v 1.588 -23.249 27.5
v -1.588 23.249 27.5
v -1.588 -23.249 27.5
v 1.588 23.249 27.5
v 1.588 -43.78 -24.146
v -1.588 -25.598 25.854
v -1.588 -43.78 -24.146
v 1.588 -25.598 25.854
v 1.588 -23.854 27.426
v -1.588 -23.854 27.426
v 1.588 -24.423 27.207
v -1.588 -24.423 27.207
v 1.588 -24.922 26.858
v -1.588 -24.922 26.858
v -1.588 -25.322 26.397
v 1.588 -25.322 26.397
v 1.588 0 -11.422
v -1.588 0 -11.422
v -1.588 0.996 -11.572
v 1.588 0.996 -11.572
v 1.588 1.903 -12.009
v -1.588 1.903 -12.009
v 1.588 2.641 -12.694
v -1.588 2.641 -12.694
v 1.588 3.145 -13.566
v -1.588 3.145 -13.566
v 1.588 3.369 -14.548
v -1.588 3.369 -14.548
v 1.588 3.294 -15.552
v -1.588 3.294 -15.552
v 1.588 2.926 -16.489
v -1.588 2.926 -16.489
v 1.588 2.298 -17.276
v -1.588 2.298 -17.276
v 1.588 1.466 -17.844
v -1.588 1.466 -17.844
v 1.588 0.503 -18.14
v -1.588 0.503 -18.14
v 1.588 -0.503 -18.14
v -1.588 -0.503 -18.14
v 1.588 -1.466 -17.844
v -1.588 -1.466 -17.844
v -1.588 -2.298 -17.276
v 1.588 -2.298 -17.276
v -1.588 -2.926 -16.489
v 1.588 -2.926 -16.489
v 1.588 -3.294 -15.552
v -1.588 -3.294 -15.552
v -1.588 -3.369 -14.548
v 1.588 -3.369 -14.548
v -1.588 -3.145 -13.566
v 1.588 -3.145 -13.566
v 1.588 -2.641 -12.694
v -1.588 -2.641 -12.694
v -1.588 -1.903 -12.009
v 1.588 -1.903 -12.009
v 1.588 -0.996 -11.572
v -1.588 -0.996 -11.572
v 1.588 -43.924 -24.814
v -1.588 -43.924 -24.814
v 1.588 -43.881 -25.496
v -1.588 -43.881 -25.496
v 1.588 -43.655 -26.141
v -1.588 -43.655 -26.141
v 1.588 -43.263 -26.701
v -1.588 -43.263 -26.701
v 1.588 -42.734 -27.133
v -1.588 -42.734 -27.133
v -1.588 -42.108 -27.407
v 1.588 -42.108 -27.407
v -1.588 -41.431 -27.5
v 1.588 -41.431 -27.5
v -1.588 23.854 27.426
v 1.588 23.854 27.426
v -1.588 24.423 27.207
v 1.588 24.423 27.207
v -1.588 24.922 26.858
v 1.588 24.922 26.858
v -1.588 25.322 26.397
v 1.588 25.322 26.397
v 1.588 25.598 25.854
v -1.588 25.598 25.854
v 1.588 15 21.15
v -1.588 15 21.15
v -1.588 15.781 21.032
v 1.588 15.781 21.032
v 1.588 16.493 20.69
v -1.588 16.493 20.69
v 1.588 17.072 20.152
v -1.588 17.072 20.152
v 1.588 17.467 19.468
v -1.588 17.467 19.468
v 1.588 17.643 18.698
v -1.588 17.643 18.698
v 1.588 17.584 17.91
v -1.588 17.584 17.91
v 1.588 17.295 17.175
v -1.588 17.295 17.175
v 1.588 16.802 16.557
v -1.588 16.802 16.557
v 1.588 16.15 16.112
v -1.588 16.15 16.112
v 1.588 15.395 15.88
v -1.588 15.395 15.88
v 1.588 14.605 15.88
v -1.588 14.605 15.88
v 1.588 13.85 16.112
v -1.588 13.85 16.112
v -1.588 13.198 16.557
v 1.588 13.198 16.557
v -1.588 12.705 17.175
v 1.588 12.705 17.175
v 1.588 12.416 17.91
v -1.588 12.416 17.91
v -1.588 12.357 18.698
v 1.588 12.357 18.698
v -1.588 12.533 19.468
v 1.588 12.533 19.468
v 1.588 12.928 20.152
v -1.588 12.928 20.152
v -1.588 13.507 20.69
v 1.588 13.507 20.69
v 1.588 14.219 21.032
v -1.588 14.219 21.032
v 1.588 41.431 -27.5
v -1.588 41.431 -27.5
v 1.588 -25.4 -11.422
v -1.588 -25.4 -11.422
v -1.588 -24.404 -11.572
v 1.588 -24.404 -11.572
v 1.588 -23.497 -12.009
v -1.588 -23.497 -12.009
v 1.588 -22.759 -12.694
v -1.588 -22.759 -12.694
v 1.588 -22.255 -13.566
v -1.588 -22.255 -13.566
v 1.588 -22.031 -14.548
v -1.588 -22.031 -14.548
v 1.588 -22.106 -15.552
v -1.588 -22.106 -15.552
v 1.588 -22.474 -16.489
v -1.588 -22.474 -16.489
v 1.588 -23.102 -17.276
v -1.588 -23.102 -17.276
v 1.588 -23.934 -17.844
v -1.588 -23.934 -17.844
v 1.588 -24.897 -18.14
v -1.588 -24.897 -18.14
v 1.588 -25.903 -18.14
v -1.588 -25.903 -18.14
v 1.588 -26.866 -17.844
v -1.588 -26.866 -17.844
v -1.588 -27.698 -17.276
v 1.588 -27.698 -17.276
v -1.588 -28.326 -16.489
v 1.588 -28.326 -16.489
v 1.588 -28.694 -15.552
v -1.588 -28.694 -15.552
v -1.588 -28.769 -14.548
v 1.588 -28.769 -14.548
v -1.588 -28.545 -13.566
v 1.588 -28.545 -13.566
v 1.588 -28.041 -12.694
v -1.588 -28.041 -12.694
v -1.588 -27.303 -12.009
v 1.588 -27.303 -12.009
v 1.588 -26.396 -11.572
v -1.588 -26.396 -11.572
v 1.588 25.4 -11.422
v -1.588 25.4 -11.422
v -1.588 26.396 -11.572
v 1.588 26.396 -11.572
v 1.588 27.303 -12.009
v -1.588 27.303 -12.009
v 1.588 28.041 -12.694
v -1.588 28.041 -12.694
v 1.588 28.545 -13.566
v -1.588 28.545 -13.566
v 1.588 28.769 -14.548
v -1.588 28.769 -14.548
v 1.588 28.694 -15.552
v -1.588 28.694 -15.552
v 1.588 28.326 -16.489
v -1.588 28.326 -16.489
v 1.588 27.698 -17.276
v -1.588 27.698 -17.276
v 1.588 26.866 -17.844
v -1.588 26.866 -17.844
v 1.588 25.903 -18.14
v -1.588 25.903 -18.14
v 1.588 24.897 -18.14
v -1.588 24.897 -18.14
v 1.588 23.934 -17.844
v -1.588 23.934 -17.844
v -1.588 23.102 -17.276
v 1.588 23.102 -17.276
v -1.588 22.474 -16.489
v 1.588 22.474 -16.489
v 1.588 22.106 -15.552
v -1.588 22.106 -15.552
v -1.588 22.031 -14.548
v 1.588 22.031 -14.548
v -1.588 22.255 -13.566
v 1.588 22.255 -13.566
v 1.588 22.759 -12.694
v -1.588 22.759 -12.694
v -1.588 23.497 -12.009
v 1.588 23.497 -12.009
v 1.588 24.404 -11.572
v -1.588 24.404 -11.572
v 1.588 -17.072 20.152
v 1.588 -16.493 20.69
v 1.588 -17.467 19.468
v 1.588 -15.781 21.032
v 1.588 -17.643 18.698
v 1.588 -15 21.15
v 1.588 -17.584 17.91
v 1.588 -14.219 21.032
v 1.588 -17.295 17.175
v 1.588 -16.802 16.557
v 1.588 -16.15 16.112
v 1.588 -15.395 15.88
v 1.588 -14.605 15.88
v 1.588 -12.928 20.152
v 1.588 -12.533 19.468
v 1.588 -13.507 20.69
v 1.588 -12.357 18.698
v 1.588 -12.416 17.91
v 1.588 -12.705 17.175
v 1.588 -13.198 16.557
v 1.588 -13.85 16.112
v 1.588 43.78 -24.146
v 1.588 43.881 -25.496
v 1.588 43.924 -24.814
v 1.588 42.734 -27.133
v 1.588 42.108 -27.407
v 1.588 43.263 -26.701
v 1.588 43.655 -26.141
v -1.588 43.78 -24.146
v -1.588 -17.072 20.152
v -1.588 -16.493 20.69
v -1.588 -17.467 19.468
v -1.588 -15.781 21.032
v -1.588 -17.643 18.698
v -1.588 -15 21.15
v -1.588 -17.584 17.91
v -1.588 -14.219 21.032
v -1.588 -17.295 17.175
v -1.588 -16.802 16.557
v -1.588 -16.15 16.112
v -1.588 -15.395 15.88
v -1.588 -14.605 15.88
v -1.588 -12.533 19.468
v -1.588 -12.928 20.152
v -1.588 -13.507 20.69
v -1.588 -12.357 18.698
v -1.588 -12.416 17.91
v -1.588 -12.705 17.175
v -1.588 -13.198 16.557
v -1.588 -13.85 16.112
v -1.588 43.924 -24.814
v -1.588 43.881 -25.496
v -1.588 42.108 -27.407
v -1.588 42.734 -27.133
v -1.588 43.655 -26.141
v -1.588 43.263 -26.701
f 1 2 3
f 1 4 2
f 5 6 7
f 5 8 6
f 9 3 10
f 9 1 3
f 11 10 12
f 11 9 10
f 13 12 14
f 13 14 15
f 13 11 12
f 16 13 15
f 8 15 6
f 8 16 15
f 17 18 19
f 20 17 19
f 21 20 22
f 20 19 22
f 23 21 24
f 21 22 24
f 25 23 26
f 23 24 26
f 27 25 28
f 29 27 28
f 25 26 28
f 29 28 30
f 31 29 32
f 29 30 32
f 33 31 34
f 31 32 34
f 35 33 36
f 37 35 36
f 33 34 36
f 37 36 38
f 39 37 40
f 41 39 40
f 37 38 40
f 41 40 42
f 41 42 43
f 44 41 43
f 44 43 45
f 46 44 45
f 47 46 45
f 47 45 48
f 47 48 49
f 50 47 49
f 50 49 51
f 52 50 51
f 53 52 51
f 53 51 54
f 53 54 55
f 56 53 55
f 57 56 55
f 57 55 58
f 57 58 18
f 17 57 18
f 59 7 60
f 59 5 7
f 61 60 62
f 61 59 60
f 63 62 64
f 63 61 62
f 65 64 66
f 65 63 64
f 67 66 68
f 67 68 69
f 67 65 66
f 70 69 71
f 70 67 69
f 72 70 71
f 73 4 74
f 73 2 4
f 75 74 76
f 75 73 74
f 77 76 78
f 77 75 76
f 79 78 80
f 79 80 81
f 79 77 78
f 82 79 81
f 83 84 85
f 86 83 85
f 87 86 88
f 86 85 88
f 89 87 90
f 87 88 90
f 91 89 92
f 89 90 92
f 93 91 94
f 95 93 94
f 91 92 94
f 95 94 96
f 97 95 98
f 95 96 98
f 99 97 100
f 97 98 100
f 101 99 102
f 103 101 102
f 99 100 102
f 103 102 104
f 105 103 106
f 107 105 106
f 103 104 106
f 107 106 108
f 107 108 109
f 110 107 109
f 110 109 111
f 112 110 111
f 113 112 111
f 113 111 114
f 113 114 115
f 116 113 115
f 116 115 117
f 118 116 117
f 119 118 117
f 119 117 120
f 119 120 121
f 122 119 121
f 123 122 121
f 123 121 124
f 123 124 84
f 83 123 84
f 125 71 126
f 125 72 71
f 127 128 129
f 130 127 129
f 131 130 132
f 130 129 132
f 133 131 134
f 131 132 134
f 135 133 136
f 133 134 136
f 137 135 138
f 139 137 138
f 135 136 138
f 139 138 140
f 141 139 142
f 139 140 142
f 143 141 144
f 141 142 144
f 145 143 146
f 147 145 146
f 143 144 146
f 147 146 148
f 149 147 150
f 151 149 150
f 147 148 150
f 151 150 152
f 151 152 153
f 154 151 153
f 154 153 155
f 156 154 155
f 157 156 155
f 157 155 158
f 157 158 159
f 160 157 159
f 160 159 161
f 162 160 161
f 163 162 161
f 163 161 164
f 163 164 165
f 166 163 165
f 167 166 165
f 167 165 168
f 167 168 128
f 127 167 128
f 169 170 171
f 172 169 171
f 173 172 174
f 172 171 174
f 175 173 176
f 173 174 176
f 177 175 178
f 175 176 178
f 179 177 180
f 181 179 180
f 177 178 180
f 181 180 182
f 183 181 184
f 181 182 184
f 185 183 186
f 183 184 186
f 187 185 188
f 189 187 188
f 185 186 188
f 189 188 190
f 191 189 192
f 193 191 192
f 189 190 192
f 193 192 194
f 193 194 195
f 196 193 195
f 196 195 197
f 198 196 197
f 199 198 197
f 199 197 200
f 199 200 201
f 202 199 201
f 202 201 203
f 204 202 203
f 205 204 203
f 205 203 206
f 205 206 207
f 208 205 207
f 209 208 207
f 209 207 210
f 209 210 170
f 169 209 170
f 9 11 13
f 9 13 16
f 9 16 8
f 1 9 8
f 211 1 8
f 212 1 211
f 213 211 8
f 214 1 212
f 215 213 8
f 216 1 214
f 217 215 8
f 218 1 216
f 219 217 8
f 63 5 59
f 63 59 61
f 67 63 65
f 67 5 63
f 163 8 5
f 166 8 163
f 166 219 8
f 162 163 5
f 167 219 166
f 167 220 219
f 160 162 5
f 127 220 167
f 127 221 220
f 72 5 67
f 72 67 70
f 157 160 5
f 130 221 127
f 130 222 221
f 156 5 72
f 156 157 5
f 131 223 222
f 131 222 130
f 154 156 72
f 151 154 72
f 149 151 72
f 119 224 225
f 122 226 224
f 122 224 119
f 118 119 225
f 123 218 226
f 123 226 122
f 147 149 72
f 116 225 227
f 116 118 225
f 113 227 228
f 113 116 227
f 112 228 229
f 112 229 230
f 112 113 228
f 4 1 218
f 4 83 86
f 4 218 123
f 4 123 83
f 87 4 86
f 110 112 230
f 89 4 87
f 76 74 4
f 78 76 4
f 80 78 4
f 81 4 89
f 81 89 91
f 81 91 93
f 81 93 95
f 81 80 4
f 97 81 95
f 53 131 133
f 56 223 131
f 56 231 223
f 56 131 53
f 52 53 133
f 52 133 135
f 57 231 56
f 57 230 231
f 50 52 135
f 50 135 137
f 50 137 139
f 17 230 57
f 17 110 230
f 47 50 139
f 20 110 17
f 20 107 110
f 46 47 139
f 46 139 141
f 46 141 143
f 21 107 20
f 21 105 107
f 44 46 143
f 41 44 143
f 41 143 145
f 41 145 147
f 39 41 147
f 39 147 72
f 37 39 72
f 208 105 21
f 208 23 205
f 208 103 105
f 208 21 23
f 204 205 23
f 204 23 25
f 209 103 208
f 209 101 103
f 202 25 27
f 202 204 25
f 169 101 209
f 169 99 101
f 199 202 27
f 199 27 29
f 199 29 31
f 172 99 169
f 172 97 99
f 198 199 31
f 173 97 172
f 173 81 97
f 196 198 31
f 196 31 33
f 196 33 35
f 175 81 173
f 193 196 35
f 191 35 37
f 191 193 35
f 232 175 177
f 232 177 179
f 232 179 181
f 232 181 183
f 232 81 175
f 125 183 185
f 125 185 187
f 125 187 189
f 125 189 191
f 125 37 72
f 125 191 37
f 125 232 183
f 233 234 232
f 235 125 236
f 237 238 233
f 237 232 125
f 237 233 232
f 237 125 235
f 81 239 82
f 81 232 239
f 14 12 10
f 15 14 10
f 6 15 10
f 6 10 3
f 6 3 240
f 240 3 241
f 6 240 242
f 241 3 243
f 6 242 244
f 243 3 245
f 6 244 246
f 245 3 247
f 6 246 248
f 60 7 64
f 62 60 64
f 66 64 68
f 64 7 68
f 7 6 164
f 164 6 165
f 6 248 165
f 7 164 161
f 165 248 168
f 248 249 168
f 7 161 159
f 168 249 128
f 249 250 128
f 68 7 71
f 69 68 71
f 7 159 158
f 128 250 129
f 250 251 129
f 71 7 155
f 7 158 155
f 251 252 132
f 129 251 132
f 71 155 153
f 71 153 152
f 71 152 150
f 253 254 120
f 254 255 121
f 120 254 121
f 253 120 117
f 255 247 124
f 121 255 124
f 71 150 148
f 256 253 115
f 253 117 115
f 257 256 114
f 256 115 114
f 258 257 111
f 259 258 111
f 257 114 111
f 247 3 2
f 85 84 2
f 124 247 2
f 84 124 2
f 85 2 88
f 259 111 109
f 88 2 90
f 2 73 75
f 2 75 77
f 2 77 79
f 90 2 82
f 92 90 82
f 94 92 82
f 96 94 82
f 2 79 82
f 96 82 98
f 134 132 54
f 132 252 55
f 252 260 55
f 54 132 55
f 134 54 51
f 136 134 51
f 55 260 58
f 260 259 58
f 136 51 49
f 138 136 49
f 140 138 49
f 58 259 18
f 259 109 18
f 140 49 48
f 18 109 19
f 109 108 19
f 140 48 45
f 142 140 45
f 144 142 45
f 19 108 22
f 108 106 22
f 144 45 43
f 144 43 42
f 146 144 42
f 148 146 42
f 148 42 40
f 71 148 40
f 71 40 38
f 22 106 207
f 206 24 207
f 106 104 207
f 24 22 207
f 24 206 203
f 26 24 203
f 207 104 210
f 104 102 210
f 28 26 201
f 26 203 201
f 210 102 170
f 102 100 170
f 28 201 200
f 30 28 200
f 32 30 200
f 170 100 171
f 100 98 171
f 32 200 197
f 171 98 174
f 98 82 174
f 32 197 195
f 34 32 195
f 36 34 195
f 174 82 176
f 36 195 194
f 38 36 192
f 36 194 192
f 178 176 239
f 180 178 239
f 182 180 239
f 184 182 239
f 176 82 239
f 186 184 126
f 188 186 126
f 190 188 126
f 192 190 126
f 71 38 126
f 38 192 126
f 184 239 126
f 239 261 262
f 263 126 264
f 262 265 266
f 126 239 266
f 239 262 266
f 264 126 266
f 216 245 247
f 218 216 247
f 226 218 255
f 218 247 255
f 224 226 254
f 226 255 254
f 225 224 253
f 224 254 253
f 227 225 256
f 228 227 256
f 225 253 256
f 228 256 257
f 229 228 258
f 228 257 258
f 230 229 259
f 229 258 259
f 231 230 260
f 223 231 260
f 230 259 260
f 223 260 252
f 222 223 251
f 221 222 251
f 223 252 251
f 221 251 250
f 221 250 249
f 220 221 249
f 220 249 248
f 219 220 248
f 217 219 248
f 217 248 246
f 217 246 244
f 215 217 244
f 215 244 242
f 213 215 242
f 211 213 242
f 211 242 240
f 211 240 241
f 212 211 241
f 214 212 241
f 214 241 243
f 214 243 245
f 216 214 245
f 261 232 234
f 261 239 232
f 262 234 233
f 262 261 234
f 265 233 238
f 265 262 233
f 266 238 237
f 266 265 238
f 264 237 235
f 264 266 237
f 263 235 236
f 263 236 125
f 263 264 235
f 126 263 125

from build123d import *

# Parameters (mm, degrees)
F_1_8_INCH_SHEET_DEPTH     = 1.5875
M5_CLEARANCE_HOLE1_D       = 5.3
F_1_4_IN_CLEARANCE_HOLE1_D = 6.7564
FILLET1_R                  = 2.5


with BuildPart() as part:
    # Sketch1 → 1/8 Inch Sheet (new, symmetric)
    with BuildSketch(Plane(origin=(0, 0, 0), x_dir=(0, 0, -1), z_dir=(1, 0, 0))):
        Polygon((-27.5, 25), (-27.5, -25), (27.5, -45), (27.5, 45), align=None)
    extrude(amount=F_1_8_INCH_SHEET_DEPTH, both=True)

    # M5 Clearance Hole1 (through all)
    with Locations(Plane(origin=(1.5875, 0, 0), x_dir=(0, 0, -1), z_dir=(1, 0, 0))):
        with Locations((-18.5, 15), (-18.5, -15)):
            Hole(M5_CLEARANCE_HOLE1_D / 2)

    # 1/4 in Clearance Hole1 (through all)
    with Locations(Plane(origin=(1.5875, 0, 0), x_dir=(0, 0, -1), z_dir=(1, 0, 0))):
        with Locations((14.8, 25.4), (14.8, 0), (14.8, -25.4)):
            Hole(F_1_4_IN_CLEARANCE_HOLE1_D / 2)

    # Fillet1
    fillet1_edges = [part.edges().sort_by_distance(p)[0] for p in [
        (0, 45, -27.5),
        (0, -45, -27.5),
        (0, -25, 27.5),
        (0, 25, 27.5),
    ]]
    fillet(fillet1_edges, radius=FILLET1_R)


solid = part.part
